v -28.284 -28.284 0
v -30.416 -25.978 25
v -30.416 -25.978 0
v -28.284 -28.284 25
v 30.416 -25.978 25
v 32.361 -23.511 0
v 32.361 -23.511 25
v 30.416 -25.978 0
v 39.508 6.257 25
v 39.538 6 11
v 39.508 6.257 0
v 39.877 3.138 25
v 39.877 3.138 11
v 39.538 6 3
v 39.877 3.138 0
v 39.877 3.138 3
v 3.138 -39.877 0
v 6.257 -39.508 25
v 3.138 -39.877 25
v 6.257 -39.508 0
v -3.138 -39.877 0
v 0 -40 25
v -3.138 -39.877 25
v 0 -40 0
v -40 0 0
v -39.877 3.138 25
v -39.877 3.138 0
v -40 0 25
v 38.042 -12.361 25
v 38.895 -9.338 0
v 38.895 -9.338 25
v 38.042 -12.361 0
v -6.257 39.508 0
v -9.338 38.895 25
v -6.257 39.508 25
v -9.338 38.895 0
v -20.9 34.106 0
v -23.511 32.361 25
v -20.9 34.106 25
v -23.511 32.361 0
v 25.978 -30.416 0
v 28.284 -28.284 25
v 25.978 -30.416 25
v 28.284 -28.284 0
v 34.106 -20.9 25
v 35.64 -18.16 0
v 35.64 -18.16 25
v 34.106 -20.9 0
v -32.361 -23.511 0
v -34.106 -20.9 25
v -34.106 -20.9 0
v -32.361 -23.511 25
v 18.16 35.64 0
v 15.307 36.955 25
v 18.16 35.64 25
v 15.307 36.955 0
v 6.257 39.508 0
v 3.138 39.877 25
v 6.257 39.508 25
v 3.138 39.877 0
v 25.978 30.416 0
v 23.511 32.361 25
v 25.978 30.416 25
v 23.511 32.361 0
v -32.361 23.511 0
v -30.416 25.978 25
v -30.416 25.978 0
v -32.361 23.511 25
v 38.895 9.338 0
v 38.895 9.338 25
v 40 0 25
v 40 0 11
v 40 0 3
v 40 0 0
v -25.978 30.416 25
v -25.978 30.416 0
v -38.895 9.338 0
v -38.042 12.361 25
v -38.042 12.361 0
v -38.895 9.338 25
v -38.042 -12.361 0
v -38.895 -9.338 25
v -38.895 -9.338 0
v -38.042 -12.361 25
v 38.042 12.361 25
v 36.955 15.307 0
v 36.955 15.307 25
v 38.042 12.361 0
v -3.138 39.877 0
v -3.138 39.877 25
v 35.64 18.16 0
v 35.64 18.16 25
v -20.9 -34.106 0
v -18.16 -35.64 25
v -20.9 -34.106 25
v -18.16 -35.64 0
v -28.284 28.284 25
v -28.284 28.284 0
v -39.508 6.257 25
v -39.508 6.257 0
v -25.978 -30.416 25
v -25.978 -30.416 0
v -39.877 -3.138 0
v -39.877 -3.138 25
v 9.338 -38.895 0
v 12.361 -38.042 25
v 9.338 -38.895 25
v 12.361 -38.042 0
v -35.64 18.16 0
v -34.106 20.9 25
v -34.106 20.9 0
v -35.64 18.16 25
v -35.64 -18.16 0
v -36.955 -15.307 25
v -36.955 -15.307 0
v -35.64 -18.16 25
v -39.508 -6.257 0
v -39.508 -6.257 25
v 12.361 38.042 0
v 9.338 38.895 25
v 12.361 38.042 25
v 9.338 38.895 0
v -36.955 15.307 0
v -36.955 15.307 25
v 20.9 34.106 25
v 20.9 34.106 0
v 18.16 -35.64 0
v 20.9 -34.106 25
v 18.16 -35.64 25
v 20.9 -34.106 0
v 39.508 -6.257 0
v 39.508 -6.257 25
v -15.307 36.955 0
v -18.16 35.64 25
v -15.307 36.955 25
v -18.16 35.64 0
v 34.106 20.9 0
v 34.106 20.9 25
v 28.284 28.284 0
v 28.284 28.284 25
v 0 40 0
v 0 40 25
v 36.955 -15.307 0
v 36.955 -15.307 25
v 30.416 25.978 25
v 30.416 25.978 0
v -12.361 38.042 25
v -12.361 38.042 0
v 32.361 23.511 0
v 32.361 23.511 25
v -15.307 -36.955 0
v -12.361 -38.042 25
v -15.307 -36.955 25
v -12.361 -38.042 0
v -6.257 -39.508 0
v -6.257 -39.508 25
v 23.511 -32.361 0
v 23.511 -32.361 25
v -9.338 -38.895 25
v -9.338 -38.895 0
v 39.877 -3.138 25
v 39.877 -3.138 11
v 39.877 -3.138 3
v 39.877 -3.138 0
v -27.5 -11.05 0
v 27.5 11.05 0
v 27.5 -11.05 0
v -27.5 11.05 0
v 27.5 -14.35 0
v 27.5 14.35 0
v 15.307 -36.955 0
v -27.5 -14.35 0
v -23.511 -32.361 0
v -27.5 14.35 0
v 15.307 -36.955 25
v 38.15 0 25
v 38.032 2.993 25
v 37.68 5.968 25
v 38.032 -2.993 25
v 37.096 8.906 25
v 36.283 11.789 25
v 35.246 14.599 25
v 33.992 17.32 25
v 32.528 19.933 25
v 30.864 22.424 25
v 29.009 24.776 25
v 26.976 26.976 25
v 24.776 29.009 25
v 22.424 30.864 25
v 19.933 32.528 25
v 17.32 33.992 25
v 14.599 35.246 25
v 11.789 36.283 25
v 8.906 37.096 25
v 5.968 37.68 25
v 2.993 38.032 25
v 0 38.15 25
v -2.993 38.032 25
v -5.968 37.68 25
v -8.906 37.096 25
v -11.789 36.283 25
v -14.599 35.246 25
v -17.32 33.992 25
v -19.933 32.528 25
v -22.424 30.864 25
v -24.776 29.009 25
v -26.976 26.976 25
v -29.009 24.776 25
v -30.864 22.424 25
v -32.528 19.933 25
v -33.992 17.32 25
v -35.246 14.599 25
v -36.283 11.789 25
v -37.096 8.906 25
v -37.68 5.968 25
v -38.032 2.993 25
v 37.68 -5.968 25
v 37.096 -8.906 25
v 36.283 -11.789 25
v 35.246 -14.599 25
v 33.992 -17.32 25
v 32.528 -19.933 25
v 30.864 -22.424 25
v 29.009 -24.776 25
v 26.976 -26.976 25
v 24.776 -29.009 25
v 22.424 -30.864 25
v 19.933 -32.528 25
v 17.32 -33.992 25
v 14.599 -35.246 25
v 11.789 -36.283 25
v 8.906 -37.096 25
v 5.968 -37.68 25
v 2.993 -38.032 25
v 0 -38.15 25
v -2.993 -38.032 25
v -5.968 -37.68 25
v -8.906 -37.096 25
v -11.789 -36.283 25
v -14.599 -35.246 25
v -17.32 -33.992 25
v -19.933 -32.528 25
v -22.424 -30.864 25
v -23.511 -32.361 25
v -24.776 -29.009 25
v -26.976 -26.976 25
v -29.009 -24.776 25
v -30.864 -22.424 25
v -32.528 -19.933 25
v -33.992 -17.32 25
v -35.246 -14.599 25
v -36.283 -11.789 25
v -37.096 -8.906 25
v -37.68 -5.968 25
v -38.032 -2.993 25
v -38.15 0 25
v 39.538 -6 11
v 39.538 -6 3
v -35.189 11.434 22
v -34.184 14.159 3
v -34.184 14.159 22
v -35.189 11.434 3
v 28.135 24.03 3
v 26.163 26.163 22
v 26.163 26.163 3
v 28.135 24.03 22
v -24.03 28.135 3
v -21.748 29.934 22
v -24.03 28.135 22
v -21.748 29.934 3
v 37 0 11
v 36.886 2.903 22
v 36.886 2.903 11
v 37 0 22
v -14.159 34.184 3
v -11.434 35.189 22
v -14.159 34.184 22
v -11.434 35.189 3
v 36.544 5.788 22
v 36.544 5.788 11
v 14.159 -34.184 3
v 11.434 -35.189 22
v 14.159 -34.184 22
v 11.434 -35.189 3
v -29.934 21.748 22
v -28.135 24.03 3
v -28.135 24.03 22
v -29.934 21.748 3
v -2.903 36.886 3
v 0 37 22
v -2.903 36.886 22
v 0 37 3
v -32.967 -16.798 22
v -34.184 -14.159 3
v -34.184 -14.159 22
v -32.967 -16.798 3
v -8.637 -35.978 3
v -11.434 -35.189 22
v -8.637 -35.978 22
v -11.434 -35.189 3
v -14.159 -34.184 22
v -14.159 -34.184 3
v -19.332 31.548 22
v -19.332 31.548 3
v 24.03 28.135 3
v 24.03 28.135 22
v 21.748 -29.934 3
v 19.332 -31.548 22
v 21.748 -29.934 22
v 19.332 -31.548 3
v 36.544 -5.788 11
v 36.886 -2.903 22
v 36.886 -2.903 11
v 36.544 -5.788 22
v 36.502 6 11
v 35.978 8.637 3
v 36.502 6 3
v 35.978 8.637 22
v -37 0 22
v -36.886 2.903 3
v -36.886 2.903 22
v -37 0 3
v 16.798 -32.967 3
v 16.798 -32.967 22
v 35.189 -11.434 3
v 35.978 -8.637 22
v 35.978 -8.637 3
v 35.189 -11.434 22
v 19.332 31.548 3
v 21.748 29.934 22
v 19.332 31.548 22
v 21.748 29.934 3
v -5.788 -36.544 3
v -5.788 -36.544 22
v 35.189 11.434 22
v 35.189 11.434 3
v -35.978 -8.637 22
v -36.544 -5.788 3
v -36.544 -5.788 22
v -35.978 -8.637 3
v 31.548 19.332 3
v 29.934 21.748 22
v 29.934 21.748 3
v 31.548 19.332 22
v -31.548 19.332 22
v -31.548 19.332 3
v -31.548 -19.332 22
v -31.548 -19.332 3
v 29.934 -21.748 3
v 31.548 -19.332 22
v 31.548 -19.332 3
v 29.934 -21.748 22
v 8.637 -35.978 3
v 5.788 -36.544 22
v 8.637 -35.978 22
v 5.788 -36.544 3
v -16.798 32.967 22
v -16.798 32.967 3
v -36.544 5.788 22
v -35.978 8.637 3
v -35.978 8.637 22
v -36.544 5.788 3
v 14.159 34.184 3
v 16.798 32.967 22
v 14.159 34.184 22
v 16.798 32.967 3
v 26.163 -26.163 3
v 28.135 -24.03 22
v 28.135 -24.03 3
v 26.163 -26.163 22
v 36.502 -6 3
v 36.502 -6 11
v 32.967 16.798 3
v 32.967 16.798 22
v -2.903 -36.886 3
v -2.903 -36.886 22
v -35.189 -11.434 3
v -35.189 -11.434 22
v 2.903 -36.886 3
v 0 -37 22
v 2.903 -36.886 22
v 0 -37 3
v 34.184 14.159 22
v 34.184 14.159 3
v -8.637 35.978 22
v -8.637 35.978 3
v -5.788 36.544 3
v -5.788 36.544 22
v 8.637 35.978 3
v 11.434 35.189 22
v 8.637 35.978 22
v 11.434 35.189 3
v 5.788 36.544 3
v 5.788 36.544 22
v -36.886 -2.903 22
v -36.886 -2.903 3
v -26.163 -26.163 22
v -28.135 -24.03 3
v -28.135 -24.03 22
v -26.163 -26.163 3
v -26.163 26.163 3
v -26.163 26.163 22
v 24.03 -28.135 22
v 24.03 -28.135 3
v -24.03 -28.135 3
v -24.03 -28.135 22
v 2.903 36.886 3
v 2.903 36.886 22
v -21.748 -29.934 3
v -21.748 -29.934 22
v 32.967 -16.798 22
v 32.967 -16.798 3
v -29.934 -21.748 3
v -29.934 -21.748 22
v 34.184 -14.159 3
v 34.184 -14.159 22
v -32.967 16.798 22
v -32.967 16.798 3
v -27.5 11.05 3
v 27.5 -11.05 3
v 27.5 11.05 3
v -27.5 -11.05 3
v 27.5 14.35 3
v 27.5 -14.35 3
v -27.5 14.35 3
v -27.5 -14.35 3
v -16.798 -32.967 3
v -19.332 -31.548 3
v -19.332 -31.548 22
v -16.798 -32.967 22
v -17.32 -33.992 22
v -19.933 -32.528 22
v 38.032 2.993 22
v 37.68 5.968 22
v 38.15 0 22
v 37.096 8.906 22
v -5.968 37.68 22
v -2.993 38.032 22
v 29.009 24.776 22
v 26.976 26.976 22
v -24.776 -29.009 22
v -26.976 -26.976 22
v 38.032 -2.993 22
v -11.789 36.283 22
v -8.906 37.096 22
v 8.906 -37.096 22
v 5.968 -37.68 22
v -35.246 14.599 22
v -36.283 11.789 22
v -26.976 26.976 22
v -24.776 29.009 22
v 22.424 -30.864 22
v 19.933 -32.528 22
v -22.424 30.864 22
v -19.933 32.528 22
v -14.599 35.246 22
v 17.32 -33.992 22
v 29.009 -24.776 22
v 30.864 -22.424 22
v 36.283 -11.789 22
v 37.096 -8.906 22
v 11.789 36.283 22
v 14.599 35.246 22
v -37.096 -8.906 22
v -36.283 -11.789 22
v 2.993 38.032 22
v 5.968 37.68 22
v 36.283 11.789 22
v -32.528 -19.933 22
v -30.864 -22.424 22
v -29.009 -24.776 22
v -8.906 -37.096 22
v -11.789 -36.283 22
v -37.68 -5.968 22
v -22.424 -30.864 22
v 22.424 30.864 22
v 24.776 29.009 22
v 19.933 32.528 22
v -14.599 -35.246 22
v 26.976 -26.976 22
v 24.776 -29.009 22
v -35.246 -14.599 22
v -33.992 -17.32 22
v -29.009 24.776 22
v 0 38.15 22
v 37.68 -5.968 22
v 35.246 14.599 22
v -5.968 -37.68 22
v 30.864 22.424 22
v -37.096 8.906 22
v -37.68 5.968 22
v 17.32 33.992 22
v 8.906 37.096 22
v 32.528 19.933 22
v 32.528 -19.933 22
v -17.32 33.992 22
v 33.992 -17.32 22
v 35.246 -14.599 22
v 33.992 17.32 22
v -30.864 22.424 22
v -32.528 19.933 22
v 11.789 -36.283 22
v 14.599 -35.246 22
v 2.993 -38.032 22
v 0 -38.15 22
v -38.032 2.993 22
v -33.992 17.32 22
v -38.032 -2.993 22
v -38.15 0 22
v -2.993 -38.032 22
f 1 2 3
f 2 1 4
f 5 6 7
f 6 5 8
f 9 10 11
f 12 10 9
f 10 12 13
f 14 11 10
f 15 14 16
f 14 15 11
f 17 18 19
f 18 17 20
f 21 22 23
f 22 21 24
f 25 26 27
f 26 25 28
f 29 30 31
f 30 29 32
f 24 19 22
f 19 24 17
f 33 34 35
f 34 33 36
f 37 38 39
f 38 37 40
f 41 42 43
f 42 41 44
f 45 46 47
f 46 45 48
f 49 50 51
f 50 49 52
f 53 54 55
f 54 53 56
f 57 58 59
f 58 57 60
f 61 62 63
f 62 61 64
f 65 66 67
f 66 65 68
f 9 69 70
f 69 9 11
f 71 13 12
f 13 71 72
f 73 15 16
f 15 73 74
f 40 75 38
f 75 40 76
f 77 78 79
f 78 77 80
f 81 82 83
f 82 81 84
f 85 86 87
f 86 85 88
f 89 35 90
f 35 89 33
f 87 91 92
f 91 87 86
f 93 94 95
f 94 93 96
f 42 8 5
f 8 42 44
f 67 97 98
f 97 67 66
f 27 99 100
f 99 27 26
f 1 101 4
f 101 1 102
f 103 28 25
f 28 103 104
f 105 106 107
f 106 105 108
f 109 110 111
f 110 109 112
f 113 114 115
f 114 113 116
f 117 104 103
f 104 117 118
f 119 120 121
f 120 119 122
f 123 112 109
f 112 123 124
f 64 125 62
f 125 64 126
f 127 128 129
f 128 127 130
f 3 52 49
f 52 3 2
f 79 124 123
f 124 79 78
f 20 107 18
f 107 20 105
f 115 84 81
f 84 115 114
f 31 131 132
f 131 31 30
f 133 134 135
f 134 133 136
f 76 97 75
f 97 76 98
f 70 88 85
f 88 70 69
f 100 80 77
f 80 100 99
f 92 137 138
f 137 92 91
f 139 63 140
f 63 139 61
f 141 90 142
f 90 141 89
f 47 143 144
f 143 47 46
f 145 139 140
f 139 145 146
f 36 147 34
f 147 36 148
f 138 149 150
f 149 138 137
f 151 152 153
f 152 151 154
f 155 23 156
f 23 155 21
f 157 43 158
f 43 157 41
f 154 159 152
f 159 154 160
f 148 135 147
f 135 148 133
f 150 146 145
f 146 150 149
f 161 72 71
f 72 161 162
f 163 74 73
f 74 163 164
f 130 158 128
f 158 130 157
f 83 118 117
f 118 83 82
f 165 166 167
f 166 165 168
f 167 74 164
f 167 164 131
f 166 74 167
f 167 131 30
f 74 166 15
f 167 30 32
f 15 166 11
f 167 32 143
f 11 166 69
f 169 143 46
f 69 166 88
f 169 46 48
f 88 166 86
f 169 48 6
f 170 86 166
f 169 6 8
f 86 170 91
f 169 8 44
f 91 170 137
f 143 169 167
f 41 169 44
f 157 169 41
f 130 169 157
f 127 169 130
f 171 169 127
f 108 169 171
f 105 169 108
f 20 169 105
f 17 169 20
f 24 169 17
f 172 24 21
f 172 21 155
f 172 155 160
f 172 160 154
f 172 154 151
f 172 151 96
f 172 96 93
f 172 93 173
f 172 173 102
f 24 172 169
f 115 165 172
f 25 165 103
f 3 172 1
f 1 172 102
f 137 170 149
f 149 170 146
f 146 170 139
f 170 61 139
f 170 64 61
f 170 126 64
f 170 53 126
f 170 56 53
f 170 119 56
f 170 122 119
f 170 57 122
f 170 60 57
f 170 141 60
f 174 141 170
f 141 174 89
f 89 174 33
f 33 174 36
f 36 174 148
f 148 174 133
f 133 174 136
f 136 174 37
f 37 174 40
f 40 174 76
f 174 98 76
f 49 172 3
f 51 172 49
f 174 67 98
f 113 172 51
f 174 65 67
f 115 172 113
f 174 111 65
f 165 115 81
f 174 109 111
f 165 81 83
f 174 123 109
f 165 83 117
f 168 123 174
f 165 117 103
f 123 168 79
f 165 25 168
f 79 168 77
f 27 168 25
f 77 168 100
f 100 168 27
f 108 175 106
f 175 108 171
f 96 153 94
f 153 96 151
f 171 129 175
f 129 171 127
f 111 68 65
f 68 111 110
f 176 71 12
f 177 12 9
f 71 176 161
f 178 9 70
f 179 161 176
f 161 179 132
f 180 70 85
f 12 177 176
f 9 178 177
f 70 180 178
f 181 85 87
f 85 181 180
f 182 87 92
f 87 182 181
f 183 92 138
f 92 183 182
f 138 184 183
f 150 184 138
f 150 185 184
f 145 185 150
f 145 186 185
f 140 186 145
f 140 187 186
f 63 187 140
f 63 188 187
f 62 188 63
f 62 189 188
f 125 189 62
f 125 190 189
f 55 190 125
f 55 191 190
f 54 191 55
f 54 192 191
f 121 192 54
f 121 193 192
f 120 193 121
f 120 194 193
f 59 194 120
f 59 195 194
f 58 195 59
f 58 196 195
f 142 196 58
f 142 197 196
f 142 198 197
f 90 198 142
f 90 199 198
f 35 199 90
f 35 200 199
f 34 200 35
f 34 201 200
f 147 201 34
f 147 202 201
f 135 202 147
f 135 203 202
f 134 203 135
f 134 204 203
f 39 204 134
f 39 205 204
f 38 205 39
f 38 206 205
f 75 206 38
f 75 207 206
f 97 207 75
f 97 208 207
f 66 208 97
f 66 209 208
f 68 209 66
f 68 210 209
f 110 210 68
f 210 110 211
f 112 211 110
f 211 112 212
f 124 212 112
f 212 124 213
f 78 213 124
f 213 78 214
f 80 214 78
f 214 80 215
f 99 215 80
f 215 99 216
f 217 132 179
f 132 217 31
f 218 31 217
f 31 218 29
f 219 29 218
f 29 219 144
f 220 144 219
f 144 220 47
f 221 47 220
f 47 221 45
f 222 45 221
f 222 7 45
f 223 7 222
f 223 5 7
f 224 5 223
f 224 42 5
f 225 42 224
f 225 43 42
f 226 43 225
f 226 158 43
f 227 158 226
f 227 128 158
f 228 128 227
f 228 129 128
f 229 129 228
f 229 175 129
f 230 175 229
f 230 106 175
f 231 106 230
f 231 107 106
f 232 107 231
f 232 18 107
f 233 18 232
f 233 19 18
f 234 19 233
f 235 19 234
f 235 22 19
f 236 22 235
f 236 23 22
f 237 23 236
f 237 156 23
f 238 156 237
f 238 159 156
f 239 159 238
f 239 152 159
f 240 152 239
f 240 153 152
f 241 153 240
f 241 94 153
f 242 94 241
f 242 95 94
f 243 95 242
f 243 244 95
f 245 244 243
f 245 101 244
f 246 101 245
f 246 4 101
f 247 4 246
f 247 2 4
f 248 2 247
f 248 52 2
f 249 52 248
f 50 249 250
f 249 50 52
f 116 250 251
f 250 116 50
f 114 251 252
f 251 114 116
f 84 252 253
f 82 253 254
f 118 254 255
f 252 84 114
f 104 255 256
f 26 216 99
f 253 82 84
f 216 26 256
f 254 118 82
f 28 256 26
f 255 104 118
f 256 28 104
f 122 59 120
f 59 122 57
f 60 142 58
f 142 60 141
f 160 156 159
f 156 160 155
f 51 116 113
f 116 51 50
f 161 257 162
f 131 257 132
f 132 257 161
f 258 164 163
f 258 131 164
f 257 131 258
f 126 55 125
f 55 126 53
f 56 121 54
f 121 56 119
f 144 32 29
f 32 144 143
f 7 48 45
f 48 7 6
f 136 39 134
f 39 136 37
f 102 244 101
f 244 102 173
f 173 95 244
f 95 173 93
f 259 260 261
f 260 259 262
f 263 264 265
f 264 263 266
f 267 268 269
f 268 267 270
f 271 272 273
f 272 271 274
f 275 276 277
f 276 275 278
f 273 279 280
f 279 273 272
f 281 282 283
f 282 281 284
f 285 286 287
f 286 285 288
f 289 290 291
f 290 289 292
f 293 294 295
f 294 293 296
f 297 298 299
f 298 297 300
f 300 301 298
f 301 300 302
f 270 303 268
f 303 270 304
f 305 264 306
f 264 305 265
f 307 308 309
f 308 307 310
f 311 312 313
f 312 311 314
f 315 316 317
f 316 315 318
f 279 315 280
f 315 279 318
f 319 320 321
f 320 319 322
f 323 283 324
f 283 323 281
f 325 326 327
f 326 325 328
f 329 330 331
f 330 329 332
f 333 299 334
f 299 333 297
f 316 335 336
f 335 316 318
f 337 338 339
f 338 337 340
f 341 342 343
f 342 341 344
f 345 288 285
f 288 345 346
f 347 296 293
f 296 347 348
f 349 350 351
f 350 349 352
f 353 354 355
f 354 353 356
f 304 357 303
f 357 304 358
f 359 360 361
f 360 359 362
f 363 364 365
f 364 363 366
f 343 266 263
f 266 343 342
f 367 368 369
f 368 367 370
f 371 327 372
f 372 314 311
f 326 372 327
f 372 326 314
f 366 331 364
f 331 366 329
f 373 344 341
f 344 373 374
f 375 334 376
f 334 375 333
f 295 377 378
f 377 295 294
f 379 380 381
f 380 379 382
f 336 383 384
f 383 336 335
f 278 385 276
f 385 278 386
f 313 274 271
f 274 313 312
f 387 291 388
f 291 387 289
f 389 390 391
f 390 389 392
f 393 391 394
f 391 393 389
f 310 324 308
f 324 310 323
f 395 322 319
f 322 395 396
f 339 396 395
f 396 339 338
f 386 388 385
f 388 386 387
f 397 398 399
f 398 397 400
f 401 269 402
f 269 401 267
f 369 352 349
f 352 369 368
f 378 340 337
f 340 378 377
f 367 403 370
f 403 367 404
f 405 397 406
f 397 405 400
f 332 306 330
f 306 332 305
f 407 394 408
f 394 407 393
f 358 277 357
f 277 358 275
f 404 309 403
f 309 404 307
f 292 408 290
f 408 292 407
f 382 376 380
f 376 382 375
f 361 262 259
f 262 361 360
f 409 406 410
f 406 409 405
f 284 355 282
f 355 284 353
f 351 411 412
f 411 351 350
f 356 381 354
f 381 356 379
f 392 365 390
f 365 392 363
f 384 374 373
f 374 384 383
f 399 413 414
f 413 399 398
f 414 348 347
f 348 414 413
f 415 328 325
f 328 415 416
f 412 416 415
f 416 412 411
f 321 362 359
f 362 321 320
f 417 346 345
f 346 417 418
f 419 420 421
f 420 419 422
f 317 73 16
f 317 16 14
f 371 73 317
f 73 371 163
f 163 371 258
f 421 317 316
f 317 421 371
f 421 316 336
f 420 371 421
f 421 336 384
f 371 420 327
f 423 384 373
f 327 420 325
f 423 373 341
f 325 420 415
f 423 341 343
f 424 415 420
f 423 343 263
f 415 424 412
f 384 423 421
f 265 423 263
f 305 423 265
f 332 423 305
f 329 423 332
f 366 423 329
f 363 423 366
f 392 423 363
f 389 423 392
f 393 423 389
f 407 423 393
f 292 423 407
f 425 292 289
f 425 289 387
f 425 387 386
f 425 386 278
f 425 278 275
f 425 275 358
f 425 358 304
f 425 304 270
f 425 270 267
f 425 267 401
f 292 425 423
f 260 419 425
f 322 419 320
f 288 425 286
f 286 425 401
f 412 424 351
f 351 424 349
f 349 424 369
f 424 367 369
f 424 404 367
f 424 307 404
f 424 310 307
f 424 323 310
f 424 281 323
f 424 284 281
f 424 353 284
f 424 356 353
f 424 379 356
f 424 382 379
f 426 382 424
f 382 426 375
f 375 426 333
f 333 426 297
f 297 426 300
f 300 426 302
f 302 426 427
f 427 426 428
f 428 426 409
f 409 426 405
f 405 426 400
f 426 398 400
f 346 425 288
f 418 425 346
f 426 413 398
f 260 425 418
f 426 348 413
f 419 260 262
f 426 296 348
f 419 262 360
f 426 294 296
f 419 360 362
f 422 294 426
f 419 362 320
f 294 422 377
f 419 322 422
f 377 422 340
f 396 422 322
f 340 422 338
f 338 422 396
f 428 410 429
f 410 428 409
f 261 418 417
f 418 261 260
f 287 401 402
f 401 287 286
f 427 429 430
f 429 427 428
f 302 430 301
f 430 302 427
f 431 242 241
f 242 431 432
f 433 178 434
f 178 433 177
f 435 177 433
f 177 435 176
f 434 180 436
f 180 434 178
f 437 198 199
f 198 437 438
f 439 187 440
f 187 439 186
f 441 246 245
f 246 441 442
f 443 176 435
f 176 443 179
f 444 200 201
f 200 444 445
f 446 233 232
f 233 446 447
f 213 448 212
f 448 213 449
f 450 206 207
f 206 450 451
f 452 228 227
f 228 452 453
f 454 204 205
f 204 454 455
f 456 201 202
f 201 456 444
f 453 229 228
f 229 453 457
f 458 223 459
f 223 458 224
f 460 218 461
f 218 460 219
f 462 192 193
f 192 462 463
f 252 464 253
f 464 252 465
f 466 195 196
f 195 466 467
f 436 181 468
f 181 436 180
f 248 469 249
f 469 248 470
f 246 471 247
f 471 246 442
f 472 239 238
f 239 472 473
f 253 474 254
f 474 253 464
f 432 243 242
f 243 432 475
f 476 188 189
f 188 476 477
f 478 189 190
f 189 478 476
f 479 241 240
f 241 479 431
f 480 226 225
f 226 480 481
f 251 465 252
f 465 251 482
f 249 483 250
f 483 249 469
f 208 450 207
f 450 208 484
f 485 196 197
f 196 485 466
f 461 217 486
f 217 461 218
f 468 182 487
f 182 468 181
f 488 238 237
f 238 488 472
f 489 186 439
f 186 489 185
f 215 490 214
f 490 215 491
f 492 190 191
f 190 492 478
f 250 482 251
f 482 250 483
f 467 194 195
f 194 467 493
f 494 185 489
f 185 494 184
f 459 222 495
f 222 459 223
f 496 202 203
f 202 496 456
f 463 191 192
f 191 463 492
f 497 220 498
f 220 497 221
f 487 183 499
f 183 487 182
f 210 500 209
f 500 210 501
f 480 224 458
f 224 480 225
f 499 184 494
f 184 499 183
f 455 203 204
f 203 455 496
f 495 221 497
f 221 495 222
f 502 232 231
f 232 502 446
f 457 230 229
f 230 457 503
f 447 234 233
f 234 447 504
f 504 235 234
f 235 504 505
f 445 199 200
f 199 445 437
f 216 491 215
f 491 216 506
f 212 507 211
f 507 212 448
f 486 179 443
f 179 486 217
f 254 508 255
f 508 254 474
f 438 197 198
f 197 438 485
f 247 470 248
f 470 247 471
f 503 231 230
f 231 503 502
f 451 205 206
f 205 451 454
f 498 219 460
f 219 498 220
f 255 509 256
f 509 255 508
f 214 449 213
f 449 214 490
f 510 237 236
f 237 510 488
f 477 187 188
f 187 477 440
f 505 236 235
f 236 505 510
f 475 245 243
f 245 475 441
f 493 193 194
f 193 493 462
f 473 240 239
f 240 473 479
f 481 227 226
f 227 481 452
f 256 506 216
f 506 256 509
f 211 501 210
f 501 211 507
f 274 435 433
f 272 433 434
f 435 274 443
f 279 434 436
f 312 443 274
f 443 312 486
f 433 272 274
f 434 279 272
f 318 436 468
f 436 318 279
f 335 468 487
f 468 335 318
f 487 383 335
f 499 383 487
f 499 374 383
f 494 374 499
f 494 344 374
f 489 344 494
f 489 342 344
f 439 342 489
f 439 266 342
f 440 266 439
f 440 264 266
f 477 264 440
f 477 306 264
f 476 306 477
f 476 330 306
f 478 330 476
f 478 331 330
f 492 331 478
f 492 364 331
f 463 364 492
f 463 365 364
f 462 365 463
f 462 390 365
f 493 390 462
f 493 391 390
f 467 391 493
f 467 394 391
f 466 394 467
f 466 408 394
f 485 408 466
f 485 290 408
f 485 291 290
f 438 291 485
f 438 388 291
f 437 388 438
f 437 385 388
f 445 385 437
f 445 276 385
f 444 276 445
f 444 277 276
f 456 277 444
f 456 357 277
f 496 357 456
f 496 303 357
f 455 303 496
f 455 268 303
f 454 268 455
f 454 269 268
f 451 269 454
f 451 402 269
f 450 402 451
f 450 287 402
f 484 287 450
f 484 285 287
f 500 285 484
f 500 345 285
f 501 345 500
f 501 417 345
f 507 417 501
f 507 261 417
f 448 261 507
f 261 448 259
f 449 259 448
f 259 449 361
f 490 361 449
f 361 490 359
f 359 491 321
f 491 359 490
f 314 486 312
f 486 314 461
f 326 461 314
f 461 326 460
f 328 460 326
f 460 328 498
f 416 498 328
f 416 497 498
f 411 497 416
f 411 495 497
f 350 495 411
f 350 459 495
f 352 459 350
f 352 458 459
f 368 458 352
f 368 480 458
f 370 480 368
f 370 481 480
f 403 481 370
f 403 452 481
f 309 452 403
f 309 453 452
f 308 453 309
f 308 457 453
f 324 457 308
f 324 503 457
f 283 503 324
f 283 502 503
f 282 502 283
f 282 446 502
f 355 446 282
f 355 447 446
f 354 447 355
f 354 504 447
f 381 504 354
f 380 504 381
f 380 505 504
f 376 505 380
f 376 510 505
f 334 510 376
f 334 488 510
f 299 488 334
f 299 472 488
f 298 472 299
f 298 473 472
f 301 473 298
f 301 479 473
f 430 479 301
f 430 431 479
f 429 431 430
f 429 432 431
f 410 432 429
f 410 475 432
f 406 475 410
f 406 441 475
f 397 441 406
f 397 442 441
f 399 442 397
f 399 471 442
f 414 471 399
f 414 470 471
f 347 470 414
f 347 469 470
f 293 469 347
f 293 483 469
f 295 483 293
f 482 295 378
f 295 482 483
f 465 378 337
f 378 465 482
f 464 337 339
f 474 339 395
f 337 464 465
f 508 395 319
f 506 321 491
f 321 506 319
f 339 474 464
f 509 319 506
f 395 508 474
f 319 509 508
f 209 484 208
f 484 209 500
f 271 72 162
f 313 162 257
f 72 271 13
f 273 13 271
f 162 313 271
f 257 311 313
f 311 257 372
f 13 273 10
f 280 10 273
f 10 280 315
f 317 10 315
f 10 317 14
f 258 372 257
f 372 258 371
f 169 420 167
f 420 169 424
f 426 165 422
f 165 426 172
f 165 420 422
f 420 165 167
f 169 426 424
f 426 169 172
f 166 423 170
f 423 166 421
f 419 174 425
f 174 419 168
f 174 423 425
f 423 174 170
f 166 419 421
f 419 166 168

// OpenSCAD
// Status Puck Enclosure — OpenSCAD
// Circular dish with transparent PLA lid for LED diffusion
// Houses: Olimex ESP32-DevKit-Lipo Rev D + Adafruit NeoPixel Ring 12

/* === Parameters === */

// Overall dimensions
dish_outer_diameter = 80;       // Outer diameter of the dish
dish_wall_thickness = 3;        // Wall thickness (extra 1mm for lid lip)
dish_height = 25;               // Total dish height (without lid)
dish_inner_diameter = dish_outer_diameter - 2 * dish_wall_thickness;

// Lid
lid_height = 3;                 // Lid thickness (transparent PLA)
lid_tolerance = 0.3;            // Gap for press fit

// NeoPixel Ring 12
ring_outer_diameter = 37;       // Adafruit ring outer diameter
ring_inner_diameter = 23;       // Adafruit ring inner hole
ring_height = 3.5;              // Ring PCB thickness
ring_standoff_height = 15;      // Height to position ring near top

// ESP32 board (Olimex ESP32-DevKit-Lipo Rev D)
esp_length = 55;                // Board length
esp_width = 28;                 // Board width (between pin rows)
esp_total_width = 28;           // Width including headers
esp_height = 1.6;               // PCB thickness
esp_pin_length = 11;            // Length of pre-soldered header pins below PCB
esp_clearance = esp_pin_length + 1; // Height above floor for pin clearance

// USB cable exit
cable_slot_width = 12;          // Width for mini USB cable
cable_slot_height = 8;          // Height of slot

// Command strip area
strip_width = 20;               // Width of flat area on back
strip_length = 40;              // Length of flat area on back

$fn = 80;                       // Circle smoothness

/* === Modules === */

module dish_body() {
    difference() {
        // Outer cylinder
        cylinder(d=dish_outer_diameter, h=dish_height);
        
        // Hollow interior
        translate([0, 0, dish_wall_thickness])
            cylinder(d=dish_inner_diameter, h=dish_height);
        
        // Lid recess — cut a step into the top of the wall for the lid to sit in
        translate([0, 0, dish_height - lid_height])
            cylinder(d=dish_inner_diameter + 2 + lid_tolerance, h=lid_height + 1);
        
        // USB cable exit slot — at +X edge of dish wall, inline with ESP board
        translate([dish_outer_diameter/2 - dish_wall_thickness - 1, -cable_slot_width/2, dish_wall_thickness])
            cube([dish_wall_thickness + 2, cable_slot_width, cable_slot_height]);
    }
}

module ring_standoffs() {
    // 3 standoffs to hold the NeoPixel ring near the top
    // Positioned OUTSIDE the ESP32 footprint, near the dish wall
    standoff_diameter = 4;
    mount_radius = dish_inner_diameter/2 - standoff_diameter;
    
    // Place at 90, 210, 330 degrees to avoid the ESP board area and USB slot
    for (angle = [90, 210, 330]) {
        rotate([0, 0, angle])
            translate([mount_radius, 0, dish_wall_thickness])
                cylinder(d=standoff_diameter, h=ring_standoff_height);
    }
}

module esp_mount() {
    // Friction rail channels — the header pins slot into grooves
    // Board drops in from above, pins locate it precisely
    pin_row_spacing = 25.4;       // Distance between the two pin rows (centre to centre)
    channel_width = 3;            // Width of each channel (fits header pin row)
    channel_depth = esp_pin_length - 1; // Depth of channel (pins sit in but don't bottom out)
    board_length = esp_length;
    channel_tolerance = 0.3;
    
    // Two parallel channels in the floor of the dish
    // Board oriented along X axis, centred
    for (y_offset = [-pin_row_spacing/2, pin_row_spacing/2]) {
        translate([-board_length/2, y_offset - (channel_width + channel_tolerance)/2, 0])
            cube([board_length, channel_width + channel_tolerance, dish_wall_thickness + channel_depth]);
    }
}

module lid() {
    // Transparent PLA lid — flat disc that sits in the wall recess
    cylinder(d=dish_inner_diameter + 2, h=lid_height);
}

module command_strip_flat() {
    // Flat area on the bottom for command strip adhesion
    translate([-strip_length/2, -strip_width/2, 0])
        cube([strip_length, strip_width, 0.01]);
}

/* === Assembly === */

// Uncomment the part you want to export for printing:

// Main dish body
///*
difference() {
    dish_body();
    // Cut pin channels into the floor
    esp_mount();
}
//*/

// Lid — print separately in transparent PLA
// Translate beside the dish for printing
/*
translate([dish_outer_diameter + 10, 0, 0])
    lid();
*/

// Both together for preview
/*
difference() {
    color("DimGray") dish_body();
    esp_mount();
}
color("LightBlue", 0.5)
    translate([0, 0, dish_height - lid_height])
        lid();
*/
